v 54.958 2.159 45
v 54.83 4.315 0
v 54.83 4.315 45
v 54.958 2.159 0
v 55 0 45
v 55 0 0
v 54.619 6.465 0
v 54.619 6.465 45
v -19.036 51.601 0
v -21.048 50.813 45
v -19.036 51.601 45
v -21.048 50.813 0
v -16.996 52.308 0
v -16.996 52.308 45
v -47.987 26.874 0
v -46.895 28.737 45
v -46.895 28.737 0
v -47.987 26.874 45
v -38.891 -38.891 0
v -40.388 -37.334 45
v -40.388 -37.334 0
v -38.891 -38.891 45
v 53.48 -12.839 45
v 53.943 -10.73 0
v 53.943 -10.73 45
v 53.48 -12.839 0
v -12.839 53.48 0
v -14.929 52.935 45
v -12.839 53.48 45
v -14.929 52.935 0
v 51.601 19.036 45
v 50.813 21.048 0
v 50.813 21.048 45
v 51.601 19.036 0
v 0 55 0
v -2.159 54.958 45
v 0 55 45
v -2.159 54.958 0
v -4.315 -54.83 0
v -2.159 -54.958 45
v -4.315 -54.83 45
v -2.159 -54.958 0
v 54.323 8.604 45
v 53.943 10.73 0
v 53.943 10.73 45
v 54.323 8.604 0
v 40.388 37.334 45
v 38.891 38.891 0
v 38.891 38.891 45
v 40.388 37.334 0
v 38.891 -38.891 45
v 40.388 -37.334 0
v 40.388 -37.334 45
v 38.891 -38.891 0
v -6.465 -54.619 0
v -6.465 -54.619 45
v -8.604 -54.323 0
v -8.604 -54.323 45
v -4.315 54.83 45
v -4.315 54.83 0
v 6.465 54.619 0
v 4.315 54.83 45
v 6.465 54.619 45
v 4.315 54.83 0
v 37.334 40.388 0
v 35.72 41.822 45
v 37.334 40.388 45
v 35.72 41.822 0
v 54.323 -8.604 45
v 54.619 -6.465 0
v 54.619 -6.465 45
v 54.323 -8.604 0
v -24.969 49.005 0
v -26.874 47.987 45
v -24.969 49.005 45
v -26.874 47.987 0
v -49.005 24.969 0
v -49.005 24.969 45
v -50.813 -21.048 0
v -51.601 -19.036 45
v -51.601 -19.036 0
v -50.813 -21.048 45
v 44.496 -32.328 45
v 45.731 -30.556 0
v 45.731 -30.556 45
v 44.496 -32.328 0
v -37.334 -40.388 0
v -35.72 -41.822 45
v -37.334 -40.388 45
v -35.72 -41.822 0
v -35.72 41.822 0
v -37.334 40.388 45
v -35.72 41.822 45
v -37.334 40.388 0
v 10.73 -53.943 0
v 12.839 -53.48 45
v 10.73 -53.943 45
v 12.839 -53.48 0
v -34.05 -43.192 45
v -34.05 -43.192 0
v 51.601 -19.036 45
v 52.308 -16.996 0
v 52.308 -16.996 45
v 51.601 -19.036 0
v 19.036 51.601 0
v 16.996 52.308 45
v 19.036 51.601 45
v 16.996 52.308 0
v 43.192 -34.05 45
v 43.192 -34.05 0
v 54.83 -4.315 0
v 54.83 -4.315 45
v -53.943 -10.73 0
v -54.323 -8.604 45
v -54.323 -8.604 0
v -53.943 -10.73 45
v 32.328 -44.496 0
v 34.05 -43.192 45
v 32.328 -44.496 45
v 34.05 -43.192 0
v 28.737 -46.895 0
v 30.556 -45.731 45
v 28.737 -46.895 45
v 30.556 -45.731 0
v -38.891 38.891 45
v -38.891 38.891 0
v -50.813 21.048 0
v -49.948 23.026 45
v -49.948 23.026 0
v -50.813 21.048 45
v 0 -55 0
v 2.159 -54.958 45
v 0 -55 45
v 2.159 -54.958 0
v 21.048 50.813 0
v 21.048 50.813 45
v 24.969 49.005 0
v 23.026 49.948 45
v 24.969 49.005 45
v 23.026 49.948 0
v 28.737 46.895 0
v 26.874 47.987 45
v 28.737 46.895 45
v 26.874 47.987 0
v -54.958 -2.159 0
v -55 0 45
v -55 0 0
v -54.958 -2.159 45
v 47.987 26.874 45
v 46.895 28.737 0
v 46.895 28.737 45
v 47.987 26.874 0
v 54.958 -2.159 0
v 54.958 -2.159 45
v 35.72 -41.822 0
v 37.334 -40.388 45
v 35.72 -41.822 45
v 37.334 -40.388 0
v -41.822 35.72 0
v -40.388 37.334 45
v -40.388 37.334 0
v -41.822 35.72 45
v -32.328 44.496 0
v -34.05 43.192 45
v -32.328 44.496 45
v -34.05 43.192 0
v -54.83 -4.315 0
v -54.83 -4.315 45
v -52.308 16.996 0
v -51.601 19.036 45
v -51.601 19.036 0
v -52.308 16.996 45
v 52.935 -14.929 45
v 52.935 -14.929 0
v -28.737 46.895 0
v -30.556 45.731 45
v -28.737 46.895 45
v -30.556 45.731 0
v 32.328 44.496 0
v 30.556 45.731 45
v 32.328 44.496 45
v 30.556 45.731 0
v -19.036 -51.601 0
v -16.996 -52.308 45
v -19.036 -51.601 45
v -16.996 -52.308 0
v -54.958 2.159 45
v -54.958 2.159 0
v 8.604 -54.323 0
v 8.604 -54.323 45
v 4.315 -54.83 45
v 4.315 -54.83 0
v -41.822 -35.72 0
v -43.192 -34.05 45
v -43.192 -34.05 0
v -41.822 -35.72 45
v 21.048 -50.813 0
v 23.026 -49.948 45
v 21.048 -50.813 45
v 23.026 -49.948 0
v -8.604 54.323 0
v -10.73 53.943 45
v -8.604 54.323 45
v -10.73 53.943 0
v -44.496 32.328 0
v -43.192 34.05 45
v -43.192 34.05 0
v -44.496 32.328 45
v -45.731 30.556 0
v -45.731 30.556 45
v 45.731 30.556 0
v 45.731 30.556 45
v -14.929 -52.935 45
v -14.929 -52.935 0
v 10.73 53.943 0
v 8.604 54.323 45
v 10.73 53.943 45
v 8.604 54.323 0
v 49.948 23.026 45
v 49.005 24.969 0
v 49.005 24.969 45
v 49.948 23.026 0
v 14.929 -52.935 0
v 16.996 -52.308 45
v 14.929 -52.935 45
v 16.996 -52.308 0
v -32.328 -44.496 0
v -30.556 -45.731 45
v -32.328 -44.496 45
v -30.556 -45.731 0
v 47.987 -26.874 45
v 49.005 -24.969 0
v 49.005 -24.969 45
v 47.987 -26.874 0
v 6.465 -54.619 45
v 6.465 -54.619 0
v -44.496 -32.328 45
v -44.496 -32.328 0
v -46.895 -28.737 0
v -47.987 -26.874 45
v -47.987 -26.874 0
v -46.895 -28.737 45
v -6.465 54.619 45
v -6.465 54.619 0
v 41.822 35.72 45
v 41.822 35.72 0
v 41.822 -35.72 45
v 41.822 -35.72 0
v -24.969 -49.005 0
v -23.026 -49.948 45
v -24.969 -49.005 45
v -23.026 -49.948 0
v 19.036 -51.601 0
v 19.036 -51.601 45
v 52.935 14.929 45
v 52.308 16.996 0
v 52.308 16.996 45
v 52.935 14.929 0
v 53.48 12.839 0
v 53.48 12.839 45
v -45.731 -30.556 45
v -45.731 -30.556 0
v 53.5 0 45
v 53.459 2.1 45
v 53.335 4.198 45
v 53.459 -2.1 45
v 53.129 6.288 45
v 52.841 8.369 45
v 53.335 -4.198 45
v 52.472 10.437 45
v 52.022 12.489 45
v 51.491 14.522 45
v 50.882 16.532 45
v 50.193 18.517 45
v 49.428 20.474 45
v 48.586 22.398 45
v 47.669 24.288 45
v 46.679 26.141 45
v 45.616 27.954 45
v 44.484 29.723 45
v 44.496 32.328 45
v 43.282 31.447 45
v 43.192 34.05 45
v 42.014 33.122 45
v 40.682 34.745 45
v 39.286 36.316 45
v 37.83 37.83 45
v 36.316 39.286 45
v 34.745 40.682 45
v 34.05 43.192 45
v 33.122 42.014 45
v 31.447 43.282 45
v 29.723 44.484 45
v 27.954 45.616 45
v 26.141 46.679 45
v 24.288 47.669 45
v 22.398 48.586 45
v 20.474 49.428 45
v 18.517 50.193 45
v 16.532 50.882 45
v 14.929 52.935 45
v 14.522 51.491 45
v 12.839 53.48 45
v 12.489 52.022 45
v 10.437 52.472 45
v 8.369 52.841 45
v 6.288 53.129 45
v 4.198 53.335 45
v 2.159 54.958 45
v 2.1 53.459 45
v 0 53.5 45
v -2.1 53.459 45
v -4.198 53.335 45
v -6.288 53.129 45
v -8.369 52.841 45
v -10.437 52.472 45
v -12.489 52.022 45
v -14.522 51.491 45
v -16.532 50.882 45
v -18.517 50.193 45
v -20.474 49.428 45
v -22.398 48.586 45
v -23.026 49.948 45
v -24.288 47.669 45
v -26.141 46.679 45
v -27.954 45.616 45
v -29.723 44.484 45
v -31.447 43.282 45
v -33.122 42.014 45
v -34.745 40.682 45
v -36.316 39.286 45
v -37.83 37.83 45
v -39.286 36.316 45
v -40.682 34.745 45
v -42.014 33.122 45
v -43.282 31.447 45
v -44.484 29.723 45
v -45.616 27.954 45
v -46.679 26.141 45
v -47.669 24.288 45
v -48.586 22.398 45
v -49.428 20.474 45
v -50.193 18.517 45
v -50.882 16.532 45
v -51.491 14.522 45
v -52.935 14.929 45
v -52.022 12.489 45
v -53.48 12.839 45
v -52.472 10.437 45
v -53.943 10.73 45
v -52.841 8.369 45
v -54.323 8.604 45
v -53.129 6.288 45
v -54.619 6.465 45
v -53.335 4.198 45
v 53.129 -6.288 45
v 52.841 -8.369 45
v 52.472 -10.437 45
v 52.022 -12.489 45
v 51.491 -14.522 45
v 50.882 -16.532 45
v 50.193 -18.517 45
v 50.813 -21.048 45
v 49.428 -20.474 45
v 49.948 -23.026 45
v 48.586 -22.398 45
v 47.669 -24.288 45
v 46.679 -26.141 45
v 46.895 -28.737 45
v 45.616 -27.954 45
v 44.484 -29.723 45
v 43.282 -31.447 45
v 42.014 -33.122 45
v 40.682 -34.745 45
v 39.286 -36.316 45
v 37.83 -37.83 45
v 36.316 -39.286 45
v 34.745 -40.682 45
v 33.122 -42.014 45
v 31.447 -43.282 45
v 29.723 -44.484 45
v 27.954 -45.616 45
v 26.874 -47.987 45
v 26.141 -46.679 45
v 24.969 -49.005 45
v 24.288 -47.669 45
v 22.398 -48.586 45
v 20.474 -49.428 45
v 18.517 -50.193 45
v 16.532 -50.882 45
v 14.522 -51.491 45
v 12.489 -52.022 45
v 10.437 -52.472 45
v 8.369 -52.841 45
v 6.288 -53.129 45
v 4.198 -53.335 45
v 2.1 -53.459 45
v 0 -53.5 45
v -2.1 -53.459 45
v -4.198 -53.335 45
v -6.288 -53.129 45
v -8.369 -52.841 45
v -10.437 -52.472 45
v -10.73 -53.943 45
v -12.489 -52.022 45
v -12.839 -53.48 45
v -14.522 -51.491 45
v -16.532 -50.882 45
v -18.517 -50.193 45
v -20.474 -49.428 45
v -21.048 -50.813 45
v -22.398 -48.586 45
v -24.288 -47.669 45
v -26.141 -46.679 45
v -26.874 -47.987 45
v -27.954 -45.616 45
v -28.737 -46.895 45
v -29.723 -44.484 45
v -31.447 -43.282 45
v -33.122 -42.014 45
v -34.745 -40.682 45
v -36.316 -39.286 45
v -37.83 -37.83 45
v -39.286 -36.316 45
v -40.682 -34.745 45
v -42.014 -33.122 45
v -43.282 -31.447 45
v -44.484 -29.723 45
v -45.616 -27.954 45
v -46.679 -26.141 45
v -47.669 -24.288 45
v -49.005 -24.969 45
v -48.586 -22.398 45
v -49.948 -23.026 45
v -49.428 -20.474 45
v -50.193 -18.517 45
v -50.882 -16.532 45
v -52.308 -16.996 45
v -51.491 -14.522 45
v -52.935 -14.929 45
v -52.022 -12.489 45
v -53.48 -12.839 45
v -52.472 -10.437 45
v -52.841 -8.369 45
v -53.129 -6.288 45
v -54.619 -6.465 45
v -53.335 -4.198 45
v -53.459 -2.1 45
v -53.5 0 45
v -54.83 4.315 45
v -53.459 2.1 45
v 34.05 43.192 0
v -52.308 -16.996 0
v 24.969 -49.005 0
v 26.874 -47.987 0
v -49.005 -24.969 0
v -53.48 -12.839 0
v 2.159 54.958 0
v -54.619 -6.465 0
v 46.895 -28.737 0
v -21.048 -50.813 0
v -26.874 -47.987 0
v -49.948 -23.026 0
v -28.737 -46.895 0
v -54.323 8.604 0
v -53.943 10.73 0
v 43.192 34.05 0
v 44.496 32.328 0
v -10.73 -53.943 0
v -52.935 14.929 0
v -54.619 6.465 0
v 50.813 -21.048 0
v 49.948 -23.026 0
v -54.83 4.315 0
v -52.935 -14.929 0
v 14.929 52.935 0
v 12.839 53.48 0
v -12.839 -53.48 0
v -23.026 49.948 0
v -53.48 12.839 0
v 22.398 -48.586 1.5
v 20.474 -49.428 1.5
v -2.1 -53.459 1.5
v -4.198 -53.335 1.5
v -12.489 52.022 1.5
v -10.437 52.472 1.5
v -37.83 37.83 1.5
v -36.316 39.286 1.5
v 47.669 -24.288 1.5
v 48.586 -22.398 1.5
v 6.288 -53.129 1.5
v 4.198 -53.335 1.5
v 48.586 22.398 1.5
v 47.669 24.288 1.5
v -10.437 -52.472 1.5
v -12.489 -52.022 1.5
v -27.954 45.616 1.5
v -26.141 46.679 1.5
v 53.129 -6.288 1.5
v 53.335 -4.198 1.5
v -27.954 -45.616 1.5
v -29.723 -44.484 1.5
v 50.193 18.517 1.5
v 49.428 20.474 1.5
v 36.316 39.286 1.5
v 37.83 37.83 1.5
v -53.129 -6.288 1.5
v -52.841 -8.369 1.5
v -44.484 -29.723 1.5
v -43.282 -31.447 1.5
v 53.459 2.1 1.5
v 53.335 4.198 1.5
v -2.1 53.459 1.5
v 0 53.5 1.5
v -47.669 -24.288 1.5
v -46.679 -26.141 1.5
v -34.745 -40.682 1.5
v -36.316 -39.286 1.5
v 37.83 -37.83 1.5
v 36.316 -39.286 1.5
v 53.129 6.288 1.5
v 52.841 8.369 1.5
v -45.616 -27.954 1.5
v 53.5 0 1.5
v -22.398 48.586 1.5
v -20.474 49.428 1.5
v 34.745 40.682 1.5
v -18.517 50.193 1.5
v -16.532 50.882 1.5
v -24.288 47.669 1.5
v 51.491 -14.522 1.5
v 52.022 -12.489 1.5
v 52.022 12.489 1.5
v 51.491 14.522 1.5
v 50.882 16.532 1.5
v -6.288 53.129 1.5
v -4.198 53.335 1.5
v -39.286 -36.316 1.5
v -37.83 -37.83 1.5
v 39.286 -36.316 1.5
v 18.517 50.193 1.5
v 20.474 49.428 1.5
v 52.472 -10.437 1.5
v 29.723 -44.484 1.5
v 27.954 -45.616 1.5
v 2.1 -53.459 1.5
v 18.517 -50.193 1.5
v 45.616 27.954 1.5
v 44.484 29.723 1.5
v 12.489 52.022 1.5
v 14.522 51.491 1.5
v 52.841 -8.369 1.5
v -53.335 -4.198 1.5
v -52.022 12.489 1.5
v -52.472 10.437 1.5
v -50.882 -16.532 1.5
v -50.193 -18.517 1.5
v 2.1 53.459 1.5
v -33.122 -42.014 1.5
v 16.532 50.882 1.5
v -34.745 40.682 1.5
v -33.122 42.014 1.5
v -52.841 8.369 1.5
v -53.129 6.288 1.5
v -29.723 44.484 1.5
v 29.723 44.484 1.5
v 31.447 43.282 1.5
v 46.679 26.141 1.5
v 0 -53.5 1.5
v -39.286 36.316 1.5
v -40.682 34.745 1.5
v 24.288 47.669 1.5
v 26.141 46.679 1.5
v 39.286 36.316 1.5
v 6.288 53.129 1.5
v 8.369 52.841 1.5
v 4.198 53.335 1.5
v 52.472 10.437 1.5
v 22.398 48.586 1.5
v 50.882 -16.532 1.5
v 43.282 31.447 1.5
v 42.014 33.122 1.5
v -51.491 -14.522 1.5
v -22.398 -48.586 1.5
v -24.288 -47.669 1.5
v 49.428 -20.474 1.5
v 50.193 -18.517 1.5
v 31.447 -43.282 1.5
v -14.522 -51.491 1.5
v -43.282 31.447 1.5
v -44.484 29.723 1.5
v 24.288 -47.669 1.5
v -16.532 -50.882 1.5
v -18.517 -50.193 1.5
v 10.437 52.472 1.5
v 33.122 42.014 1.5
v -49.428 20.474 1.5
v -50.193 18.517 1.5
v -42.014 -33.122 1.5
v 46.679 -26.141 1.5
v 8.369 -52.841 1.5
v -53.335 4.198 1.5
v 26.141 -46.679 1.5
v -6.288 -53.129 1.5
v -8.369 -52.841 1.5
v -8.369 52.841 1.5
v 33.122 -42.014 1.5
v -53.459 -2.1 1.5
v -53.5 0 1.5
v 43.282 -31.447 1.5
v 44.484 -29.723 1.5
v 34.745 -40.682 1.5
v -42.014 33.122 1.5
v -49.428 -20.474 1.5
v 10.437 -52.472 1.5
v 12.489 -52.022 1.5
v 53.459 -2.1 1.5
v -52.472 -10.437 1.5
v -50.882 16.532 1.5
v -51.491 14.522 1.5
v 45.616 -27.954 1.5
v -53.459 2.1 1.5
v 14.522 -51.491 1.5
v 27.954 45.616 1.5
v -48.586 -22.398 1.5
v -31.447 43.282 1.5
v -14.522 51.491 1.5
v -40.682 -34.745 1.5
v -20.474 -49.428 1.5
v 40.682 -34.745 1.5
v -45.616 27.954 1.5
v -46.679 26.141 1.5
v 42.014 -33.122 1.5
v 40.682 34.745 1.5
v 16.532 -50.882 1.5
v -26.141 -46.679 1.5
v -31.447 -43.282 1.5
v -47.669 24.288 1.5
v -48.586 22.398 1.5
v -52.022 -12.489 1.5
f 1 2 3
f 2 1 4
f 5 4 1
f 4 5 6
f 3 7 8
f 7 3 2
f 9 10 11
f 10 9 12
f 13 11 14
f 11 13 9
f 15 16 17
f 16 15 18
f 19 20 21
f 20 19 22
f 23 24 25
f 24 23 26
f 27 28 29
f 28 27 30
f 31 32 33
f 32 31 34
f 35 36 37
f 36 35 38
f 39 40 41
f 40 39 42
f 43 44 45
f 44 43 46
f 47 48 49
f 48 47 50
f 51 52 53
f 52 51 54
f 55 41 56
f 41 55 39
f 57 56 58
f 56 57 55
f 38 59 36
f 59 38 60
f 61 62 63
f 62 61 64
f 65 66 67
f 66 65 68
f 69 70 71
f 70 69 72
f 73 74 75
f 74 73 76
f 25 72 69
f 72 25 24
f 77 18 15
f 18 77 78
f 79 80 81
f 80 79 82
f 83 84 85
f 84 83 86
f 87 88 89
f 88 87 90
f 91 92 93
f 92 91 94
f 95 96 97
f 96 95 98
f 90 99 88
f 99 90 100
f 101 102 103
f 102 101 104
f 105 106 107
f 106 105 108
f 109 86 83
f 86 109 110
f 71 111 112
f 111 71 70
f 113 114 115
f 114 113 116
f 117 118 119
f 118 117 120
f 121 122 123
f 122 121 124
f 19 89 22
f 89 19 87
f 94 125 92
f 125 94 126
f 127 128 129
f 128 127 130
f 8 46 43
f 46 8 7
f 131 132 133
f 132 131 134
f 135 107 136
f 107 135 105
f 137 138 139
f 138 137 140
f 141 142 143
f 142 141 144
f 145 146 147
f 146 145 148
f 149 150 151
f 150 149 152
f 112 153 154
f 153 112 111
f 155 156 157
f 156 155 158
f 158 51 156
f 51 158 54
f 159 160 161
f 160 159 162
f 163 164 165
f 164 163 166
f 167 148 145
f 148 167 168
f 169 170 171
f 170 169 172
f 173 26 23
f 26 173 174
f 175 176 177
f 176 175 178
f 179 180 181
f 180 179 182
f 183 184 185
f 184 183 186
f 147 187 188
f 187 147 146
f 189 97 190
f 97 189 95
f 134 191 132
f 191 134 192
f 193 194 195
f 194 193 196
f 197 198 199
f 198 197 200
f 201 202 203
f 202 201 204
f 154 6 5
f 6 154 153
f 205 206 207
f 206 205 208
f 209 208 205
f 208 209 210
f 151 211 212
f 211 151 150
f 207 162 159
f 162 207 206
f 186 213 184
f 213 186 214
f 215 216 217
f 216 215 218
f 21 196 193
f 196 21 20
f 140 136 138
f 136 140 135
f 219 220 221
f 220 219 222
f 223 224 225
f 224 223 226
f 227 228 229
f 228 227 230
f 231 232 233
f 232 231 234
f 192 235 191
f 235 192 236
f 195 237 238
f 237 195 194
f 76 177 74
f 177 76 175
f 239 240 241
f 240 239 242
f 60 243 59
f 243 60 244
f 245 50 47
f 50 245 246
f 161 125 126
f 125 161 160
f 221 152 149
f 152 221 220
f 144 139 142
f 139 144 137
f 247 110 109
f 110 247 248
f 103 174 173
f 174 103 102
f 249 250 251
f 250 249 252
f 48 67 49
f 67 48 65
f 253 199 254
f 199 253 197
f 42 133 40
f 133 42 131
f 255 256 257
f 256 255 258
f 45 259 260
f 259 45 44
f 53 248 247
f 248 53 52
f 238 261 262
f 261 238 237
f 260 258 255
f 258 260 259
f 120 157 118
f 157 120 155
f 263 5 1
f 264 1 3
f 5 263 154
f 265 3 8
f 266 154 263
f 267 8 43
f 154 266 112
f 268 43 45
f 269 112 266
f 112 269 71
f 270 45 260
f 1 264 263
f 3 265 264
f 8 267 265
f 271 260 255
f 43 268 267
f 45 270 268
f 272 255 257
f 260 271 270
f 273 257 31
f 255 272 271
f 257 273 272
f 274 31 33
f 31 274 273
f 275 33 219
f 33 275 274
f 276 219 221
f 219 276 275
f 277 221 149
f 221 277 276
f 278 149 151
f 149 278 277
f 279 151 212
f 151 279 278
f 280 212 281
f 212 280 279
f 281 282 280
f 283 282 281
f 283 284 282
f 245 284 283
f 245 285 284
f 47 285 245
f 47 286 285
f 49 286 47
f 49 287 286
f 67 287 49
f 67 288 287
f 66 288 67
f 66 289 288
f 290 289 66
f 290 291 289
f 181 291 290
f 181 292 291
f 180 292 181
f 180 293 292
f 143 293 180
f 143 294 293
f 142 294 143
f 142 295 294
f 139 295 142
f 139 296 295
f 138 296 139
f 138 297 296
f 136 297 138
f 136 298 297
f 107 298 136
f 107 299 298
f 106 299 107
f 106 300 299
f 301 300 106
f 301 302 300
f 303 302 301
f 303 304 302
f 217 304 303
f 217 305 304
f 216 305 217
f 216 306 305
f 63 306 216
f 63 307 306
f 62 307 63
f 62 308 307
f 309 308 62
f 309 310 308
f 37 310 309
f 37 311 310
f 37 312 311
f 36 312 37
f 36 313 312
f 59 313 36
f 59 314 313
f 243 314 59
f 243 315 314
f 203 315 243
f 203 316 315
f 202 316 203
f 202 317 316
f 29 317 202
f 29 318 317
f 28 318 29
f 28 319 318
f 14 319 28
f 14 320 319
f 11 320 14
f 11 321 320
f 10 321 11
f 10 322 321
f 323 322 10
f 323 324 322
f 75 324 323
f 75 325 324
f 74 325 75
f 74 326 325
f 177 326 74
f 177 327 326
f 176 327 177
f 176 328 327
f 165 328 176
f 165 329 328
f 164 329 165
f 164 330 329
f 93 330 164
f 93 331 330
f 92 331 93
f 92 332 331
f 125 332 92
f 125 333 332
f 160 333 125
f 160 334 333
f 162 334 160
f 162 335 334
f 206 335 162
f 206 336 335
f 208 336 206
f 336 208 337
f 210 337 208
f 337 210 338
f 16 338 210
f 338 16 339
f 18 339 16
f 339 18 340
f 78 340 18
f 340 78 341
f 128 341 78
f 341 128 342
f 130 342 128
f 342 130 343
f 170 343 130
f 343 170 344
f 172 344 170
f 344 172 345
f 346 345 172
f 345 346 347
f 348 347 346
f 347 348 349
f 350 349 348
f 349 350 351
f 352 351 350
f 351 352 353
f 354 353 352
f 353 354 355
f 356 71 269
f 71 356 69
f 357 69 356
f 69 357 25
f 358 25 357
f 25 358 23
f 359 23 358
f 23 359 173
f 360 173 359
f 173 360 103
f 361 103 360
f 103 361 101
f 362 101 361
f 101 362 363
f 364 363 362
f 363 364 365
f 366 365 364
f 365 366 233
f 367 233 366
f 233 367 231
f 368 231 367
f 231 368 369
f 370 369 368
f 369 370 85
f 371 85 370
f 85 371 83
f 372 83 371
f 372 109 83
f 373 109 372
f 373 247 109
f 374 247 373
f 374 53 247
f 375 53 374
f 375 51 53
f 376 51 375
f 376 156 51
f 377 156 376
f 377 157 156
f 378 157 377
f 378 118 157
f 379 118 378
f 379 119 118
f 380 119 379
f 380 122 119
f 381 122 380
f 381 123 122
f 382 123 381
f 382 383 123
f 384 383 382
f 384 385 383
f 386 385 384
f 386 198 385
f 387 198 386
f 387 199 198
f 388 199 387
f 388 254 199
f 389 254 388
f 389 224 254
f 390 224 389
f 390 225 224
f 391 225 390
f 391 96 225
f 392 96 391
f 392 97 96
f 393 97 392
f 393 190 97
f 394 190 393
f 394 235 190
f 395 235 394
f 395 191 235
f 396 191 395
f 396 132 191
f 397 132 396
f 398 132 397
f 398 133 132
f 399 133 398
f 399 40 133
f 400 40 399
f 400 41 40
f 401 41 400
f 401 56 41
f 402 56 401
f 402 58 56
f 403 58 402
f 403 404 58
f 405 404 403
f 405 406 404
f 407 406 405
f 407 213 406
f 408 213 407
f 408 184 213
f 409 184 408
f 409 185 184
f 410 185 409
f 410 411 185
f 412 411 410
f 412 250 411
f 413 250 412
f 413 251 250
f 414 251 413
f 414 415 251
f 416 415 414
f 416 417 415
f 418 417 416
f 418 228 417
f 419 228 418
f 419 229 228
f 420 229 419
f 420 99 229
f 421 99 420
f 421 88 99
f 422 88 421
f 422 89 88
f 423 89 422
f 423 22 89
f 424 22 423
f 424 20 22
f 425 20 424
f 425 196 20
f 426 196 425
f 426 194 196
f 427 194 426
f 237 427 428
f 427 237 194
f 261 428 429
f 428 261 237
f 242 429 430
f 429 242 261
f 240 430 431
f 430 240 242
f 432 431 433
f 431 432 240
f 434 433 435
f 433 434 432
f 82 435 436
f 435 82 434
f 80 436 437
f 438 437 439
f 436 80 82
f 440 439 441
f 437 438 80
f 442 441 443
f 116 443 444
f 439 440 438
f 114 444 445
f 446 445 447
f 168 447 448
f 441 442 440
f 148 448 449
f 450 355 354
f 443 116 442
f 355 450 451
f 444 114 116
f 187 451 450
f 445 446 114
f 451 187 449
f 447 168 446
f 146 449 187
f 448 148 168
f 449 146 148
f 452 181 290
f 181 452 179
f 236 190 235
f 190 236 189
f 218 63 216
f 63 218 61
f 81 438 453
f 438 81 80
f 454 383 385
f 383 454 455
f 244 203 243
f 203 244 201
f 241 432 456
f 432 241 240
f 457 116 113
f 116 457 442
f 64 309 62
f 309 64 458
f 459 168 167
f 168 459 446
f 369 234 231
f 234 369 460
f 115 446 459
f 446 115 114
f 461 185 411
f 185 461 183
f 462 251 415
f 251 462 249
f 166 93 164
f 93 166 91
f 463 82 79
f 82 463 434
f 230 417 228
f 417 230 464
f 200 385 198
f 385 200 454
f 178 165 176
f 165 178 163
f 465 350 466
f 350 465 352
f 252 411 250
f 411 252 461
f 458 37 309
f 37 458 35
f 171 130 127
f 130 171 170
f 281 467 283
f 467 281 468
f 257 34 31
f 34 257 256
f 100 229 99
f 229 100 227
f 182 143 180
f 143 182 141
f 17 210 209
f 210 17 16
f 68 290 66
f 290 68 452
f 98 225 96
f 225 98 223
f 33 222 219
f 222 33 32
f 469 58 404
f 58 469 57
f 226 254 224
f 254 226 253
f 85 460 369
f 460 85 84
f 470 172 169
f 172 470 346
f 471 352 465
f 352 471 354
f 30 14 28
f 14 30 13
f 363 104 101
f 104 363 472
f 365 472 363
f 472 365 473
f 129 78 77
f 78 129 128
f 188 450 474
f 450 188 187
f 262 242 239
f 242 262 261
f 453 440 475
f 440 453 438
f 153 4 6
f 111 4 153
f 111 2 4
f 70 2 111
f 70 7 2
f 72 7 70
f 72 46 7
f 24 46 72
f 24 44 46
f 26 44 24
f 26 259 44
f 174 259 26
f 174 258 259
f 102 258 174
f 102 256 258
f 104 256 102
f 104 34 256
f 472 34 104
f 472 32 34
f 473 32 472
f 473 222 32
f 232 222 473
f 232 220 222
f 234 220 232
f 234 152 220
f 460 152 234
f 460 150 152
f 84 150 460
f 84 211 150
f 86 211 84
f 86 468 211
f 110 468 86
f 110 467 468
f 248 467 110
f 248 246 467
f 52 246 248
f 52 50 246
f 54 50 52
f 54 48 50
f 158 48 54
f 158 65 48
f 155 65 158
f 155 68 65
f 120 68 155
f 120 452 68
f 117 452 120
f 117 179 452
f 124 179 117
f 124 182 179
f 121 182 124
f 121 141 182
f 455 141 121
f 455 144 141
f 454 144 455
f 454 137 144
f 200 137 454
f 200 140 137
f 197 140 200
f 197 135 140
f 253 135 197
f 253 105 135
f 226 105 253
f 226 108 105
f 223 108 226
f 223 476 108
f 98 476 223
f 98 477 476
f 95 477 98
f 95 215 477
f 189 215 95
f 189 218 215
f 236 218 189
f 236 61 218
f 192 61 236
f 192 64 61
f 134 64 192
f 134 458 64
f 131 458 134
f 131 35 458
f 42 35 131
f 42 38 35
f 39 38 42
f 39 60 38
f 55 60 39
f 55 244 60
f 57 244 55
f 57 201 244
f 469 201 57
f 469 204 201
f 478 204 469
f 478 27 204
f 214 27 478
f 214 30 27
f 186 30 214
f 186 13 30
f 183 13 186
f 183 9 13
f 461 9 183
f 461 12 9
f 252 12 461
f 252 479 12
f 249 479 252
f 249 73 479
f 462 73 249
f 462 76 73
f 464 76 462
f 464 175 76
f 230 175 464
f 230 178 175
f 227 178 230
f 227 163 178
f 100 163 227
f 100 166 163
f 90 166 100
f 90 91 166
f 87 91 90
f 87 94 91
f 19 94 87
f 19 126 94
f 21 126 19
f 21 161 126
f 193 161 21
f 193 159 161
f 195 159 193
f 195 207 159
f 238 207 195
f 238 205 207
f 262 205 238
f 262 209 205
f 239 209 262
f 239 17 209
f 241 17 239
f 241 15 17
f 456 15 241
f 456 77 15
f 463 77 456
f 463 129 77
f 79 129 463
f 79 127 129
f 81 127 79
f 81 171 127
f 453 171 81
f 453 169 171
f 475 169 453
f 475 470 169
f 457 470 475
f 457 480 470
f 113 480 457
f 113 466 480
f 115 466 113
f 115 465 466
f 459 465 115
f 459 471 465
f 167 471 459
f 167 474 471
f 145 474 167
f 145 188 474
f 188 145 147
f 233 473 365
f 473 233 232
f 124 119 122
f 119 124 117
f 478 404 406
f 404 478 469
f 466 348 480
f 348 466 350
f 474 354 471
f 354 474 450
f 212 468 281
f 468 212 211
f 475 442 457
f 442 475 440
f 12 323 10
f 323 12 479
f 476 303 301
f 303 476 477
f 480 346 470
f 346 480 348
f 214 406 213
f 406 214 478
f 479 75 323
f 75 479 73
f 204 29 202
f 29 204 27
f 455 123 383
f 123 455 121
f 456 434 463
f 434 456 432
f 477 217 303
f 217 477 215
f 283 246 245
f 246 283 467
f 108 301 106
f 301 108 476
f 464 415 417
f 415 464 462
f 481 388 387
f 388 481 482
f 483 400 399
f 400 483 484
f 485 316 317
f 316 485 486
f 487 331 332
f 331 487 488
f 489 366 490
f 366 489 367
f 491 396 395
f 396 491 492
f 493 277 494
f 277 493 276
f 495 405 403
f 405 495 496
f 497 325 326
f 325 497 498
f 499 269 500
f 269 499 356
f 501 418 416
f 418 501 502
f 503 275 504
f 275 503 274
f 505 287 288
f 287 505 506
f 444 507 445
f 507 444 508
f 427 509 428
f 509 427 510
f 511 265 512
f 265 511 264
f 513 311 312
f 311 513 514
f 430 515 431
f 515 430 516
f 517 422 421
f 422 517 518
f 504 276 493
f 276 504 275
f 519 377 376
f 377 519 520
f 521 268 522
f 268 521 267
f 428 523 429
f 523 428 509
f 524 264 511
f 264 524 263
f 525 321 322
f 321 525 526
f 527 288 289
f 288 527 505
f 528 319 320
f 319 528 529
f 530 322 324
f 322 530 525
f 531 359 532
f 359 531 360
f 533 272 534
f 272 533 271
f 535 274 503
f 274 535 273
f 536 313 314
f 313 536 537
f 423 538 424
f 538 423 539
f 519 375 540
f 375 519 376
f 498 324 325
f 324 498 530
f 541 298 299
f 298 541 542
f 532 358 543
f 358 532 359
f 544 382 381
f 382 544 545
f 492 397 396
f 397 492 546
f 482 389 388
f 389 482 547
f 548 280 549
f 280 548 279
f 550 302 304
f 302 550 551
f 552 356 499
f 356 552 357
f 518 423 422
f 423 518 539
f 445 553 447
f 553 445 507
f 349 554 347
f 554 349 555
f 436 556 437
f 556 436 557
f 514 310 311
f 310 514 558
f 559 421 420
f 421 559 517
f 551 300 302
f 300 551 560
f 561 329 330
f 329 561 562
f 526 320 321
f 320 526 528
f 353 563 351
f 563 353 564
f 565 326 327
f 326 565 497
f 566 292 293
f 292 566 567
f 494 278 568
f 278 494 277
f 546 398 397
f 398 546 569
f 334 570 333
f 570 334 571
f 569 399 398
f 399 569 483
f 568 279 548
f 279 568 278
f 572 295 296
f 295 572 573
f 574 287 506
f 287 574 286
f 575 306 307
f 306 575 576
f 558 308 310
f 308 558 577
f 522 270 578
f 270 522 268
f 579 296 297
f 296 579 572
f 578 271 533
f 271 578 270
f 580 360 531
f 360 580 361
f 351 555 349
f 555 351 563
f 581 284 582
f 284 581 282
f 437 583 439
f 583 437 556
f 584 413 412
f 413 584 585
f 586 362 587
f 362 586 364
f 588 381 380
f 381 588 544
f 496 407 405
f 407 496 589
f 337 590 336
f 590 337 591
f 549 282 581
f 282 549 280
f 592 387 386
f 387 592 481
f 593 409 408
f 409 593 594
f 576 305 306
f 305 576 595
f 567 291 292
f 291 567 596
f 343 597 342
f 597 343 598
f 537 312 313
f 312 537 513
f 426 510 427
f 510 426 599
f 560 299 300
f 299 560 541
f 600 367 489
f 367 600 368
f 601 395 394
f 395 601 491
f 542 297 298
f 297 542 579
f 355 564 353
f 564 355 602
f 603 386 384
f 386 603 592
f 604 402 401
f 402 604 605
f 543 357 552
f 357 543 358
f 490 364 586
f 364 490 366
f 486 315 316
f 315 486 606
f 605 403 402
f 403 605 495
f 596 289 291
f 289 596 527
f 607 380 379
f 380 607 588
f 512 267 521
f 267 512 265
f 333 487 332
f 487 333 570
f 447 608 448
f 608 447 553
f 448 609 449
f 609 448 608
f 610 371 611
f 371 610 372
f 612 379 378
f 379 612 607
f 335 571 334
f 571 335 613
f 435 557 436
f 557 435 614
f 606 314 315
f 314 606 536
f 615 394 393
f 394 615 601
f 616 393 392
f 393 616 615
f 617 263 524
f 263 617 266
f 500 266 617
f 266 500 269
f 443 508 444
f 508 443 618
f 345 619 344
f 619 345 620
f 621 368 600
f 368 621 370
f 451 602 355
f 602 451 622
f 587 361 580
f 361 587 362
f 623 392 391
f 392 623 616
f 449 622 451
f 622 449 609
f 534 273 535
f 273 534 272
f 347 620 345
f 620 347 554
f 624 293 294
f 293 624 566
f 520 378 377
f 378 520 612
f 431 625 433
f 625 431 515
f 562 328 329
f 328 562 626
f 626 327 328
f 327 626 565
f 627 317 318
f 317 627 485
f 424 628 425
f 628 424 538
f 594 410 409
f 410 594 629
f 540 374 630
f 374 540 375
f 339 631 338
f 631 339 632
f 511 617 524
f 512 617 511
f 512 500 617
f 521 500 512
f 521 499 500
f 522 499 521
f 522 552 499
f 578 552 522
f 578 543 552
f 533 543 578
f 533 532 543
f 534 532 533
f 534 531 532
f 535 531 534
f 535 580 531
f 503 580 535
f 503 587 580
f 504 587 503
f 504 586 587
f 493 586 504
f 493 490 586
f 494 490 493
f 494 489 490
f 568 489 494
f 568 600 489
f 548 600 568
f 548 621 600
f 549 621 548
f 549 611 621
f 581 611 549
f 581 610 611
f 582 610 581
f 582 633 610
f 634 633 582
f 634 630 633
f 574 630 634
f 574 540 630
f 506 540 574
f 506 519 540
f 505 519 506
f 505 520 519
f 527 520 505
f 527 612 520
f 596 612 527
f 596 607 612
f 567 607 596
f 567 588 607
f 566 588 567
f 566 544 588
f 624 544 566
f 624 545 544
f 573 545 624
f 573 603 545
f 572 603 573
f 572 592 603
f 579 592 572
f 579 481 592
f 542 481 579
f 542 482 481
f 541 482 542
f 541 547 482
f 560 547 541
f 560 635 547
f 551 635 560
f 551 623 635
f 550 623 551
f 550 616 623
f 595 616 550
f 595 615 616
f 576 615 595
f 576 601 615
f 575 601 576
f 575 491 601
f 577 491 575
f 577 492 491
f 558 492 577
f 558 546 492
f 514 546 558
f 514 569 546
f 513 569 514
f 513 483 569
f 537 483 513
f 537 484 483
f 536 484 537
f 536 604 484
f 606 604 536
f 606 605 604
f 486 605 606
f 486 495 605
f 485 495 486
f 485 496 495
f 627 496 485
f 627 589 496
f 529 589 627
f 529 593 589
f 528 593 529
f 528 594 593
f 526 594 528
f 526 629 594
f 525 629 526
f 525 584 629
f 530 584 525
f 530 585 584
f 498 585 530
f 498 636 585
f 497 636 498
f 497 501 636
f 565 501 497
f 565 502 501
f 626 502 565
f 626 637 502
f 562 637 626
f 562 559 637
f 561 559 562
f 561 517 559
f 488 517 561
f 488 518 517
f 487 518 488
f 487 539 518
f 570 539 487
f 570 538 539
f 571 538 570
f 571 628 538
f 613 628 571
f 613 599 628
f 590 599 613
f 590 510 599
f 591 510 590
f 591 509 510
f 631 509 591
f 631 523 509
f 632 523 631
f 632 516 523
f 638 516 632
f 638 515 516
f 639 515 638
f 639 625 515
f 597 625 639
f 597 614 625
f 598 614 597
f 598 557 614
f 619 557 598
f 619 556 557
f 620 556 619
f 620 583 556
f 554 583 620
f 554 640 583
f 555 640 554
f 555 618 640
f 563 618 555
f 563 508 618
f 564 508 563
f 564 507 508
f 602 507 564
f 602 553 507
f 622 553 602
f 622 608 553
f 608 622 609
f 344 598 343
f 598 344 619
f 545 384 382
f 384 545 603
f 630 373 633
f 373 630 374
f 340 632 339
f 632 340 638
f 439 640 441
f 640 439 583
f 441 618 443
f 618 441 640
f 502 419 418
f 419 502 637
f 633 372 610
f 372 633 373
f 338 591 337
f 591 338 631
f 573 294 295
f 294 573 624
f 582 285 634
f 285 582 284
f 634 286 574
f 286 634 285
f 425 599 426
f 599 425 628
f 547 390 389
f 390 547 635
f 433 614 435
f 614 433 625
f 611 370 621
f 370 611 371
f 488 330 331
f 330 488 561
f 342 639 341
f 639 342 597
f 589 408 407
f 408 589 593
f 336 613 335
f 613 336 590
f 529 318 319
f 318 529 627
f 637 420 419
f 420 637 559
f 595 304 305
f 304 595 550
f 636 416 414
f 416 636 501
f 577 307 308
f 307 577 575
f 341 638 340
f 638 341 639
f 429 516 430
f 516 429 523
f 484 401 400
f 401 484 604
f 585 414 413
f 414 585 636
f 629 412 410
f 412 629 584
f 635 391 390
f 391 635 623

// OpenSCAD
/* =============================================================================
 * 智慧香爐 — 外購元件：金屬爐盆（使用者自備）
 * =============================================================================
 * ★★ 這不是列印件，是外購品的示意模型 ★★
 * 尺寸來自 ../params.scad，★BOWL_D／BOWL_H 為估值★，買到實體請實測後改 params.scad。
 * 用途：組裝干涉檢查、螺絲可及性、目視確認裝得下。
 * ★不可當成實際尺寸寫進報告★（CLAUDE.md §7）
 *
 * 原點：盆底圓心、z=0 為盆底外緣
 * ============================================================================= */

include <../params.scad>


// 常見不鏽鋼碗／香灰盆。非列印件——燃燒由金屬承接，塑膠不接觸火源。
module bowl() {
    color("#b9bec4") difference() {
        cylinder(h = BOWL_H, d = BOWL_D, $fn = BOWL_FN);
        translate([0, 0, BOWL_WALL])
            cylinder(h = BOWL_H, d = BOWL_D - BOWL_WALL * 2, $fn = BOWL_FN);
    }
}

// ── 單獨開檔時的預覽（被 use<> 引入時不執行）──
bowl();
